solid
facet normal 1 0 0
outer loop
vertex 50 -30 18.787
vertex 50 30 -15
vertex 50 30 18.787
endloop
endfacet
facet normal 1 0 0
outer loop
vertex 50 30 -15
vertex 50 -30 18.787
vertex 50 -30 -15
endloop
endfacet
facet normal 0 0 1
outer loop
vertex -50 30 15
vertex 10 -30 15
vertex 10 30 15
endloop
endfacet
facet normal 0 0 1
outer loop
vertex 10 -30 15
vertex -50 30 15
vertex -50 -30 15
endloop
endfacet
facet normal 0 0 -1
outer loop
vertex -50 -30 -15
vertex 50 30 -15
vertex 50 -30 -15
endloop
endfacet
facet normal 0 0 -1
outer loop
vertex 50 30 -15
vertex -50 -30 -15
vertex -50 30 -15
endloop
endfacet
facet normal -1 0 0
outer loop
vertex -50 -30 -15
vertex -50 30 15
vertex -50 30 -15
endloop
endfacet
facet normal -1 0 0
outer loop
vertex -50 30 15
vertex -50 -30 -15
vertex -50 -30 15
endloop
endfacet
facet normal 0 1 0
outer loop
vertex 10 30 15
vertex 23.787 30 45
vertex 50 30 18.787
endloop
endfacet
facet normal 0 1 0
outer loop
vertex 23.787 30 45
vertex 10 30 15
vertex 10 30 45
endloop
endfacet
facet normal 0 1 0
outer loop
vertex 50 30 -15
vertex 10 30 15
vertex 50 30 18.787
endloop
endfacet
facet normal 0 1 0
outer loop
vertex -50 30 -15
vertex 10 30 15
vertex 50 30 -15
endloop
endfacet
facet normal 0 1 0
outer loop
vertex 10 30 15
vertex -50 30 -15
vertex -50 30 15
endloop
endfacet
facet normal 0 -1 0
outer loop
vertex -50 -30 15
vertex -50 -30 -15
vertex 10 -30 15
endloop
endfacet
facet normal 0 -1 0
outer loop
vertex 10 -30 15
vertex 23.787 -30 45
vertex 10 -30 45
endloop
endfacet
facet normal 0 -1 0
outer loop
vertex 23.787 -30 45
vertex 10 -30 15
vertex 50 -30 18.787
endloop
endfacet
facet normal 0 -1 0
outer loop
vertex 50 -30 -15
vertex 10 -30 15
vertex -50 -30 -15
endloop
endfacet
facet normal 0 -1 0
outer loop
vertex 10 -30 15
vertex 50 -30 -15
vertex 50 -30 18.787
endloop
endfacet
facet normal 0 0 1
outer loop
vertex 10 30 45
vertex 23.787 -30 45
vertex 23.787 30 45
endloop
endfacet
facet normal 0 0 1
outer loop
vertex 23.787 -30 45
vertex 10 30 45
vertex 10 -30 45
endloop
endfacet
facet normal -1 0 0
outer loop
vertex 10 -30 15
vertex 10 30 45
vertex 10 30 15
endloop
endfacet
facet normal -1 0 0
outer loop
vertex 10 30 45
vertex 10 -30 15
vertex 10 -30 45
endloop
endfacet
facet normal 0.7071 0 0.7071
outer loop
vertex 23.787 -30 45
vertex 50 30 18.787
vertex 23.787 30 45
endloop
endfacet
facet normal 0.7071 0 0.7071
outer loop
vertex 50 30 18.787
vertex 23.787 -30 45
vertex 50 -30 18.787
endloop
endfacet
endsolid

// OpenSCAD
difference()
{
union()
{
cube([100,60,30], true);
translate([30,0,30])cube([40,60,30], true);
}
translate([40,0,50])rotate([0,45,0]) cube([60,60,30], true);
}
